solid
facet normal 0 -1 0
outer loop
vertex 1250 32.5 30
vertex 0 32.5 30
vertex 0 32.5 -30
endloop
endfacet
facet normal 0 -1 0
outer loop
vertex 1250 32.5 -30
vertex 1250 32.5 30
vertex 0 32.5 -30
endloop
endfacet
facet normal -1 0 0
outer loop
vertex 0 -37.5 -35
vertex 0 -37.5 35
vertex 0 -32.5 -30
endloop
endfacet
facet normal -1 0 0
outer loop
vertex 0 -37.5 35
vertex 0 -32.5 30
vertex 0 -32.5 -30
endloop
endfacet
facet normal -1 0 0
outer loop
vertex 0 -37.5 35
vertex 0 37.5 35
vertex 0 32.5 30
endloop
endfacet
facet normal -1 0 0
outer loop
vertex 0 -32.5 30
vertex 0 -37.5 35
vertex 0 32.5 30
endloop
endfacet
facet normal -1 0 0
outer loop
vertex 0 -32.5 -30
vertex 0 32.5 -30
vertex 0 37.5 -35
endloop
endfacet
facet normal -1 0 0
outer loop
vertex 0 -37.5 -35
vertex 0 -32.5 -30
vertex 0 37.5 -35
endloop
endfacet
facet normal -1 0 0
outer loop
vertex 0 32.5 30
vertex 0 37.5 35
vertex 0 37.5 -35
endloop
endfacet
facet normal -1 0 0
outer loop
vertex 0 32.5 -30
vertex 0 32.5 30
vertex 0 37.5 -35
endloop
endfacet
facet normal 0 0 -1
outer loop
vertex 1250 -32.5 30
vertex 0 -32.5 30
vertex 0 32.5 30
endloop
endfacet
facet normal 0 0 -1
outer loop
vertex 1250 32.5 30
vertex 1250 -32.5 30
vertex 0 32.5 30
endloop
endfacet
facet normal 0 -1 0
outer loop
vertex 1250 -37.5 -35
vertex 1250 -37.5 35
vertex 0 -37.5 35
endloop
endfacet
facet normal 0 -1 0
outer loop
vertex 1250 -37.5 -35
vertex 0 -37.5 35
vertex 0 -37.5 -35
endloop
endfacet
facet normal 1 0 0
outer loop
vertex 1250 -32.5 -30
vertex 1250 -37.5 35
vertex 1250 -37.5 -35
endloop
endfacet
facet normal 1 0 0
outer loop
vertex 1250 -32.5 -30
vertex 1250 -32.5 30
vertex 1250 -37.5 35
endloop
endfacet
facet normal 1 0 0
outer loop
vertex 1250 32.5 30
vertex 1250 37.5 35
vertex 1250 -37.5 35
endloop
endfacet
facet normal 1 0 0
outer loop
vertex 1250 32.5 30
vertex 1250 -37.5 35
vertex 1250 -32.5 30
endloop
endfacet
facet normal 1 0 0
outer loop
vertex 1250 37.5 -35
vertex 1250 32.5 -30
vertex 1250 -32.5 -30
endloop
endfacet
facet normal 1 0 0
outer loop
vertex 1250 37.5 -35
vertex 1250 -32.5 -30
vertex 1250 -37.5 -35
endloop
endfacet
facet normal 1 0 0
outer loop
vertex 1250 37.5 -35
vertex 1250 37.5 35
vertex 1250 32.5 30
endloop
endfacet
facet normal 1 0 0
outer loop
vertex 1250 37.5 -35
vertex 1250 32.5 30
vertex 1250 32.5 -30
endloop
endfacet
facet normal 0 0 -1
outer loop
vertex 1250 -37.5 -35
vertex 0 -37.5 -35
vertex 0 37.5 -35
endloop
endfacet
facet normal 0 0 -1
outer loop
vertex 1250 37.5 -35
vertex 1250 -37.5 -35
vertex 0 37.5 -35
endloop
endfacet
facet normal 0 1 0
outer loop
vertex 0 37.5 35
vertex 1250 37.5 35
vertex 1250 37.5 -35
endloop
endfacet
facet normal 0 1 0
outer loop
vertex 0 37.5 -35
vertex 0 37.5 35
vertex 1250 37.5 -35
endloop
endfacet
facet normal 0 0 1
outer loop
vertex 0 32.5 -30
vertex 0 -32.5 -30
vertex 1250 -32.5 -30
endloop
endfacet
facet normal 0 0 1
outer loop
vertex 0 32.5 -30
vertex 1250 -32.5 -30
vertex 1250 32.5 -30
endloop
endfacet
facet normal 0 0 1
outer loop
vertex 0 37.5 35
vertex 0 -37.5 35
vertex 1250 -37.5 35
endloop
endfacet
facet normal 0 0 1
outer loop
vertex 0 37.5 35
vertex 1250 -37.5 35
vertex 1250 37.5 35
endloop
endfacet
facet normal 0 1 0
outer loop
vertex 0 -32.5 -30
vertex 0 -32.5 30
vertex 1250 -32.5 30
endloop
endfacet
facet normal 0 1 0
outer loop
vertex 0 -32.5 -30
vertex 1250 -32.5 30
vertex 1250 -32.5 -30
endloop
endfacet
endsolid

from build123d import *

# Parameters (mm, degrees)
SKETCH_2_W      = 70
SKETCH_2_H      = 75
SKETCH_2_W_2    = 60
SKETCH_2_H_2    = 65
EXTRUDE_1_DEPTH = 1250


with BuildPart() as part:
    # Эскиз2 → Вытянуть-Тонкостенный1 (new body)
    with BuildSketch(Plane(origin=(0, 0, 0), x_dir=(0, 0, -1), z_dir=(1, 0, 0))):
        Rectangle(SKETCH_2_W, SKETCH_2_H)
        Rectangle(SKETCH_2_W_2, SKETCH_2_H_2, mode=Mode.SUBTRACT)
    extrude(amount=EXTRUDE_1_DEPTH)


solid = part.part
